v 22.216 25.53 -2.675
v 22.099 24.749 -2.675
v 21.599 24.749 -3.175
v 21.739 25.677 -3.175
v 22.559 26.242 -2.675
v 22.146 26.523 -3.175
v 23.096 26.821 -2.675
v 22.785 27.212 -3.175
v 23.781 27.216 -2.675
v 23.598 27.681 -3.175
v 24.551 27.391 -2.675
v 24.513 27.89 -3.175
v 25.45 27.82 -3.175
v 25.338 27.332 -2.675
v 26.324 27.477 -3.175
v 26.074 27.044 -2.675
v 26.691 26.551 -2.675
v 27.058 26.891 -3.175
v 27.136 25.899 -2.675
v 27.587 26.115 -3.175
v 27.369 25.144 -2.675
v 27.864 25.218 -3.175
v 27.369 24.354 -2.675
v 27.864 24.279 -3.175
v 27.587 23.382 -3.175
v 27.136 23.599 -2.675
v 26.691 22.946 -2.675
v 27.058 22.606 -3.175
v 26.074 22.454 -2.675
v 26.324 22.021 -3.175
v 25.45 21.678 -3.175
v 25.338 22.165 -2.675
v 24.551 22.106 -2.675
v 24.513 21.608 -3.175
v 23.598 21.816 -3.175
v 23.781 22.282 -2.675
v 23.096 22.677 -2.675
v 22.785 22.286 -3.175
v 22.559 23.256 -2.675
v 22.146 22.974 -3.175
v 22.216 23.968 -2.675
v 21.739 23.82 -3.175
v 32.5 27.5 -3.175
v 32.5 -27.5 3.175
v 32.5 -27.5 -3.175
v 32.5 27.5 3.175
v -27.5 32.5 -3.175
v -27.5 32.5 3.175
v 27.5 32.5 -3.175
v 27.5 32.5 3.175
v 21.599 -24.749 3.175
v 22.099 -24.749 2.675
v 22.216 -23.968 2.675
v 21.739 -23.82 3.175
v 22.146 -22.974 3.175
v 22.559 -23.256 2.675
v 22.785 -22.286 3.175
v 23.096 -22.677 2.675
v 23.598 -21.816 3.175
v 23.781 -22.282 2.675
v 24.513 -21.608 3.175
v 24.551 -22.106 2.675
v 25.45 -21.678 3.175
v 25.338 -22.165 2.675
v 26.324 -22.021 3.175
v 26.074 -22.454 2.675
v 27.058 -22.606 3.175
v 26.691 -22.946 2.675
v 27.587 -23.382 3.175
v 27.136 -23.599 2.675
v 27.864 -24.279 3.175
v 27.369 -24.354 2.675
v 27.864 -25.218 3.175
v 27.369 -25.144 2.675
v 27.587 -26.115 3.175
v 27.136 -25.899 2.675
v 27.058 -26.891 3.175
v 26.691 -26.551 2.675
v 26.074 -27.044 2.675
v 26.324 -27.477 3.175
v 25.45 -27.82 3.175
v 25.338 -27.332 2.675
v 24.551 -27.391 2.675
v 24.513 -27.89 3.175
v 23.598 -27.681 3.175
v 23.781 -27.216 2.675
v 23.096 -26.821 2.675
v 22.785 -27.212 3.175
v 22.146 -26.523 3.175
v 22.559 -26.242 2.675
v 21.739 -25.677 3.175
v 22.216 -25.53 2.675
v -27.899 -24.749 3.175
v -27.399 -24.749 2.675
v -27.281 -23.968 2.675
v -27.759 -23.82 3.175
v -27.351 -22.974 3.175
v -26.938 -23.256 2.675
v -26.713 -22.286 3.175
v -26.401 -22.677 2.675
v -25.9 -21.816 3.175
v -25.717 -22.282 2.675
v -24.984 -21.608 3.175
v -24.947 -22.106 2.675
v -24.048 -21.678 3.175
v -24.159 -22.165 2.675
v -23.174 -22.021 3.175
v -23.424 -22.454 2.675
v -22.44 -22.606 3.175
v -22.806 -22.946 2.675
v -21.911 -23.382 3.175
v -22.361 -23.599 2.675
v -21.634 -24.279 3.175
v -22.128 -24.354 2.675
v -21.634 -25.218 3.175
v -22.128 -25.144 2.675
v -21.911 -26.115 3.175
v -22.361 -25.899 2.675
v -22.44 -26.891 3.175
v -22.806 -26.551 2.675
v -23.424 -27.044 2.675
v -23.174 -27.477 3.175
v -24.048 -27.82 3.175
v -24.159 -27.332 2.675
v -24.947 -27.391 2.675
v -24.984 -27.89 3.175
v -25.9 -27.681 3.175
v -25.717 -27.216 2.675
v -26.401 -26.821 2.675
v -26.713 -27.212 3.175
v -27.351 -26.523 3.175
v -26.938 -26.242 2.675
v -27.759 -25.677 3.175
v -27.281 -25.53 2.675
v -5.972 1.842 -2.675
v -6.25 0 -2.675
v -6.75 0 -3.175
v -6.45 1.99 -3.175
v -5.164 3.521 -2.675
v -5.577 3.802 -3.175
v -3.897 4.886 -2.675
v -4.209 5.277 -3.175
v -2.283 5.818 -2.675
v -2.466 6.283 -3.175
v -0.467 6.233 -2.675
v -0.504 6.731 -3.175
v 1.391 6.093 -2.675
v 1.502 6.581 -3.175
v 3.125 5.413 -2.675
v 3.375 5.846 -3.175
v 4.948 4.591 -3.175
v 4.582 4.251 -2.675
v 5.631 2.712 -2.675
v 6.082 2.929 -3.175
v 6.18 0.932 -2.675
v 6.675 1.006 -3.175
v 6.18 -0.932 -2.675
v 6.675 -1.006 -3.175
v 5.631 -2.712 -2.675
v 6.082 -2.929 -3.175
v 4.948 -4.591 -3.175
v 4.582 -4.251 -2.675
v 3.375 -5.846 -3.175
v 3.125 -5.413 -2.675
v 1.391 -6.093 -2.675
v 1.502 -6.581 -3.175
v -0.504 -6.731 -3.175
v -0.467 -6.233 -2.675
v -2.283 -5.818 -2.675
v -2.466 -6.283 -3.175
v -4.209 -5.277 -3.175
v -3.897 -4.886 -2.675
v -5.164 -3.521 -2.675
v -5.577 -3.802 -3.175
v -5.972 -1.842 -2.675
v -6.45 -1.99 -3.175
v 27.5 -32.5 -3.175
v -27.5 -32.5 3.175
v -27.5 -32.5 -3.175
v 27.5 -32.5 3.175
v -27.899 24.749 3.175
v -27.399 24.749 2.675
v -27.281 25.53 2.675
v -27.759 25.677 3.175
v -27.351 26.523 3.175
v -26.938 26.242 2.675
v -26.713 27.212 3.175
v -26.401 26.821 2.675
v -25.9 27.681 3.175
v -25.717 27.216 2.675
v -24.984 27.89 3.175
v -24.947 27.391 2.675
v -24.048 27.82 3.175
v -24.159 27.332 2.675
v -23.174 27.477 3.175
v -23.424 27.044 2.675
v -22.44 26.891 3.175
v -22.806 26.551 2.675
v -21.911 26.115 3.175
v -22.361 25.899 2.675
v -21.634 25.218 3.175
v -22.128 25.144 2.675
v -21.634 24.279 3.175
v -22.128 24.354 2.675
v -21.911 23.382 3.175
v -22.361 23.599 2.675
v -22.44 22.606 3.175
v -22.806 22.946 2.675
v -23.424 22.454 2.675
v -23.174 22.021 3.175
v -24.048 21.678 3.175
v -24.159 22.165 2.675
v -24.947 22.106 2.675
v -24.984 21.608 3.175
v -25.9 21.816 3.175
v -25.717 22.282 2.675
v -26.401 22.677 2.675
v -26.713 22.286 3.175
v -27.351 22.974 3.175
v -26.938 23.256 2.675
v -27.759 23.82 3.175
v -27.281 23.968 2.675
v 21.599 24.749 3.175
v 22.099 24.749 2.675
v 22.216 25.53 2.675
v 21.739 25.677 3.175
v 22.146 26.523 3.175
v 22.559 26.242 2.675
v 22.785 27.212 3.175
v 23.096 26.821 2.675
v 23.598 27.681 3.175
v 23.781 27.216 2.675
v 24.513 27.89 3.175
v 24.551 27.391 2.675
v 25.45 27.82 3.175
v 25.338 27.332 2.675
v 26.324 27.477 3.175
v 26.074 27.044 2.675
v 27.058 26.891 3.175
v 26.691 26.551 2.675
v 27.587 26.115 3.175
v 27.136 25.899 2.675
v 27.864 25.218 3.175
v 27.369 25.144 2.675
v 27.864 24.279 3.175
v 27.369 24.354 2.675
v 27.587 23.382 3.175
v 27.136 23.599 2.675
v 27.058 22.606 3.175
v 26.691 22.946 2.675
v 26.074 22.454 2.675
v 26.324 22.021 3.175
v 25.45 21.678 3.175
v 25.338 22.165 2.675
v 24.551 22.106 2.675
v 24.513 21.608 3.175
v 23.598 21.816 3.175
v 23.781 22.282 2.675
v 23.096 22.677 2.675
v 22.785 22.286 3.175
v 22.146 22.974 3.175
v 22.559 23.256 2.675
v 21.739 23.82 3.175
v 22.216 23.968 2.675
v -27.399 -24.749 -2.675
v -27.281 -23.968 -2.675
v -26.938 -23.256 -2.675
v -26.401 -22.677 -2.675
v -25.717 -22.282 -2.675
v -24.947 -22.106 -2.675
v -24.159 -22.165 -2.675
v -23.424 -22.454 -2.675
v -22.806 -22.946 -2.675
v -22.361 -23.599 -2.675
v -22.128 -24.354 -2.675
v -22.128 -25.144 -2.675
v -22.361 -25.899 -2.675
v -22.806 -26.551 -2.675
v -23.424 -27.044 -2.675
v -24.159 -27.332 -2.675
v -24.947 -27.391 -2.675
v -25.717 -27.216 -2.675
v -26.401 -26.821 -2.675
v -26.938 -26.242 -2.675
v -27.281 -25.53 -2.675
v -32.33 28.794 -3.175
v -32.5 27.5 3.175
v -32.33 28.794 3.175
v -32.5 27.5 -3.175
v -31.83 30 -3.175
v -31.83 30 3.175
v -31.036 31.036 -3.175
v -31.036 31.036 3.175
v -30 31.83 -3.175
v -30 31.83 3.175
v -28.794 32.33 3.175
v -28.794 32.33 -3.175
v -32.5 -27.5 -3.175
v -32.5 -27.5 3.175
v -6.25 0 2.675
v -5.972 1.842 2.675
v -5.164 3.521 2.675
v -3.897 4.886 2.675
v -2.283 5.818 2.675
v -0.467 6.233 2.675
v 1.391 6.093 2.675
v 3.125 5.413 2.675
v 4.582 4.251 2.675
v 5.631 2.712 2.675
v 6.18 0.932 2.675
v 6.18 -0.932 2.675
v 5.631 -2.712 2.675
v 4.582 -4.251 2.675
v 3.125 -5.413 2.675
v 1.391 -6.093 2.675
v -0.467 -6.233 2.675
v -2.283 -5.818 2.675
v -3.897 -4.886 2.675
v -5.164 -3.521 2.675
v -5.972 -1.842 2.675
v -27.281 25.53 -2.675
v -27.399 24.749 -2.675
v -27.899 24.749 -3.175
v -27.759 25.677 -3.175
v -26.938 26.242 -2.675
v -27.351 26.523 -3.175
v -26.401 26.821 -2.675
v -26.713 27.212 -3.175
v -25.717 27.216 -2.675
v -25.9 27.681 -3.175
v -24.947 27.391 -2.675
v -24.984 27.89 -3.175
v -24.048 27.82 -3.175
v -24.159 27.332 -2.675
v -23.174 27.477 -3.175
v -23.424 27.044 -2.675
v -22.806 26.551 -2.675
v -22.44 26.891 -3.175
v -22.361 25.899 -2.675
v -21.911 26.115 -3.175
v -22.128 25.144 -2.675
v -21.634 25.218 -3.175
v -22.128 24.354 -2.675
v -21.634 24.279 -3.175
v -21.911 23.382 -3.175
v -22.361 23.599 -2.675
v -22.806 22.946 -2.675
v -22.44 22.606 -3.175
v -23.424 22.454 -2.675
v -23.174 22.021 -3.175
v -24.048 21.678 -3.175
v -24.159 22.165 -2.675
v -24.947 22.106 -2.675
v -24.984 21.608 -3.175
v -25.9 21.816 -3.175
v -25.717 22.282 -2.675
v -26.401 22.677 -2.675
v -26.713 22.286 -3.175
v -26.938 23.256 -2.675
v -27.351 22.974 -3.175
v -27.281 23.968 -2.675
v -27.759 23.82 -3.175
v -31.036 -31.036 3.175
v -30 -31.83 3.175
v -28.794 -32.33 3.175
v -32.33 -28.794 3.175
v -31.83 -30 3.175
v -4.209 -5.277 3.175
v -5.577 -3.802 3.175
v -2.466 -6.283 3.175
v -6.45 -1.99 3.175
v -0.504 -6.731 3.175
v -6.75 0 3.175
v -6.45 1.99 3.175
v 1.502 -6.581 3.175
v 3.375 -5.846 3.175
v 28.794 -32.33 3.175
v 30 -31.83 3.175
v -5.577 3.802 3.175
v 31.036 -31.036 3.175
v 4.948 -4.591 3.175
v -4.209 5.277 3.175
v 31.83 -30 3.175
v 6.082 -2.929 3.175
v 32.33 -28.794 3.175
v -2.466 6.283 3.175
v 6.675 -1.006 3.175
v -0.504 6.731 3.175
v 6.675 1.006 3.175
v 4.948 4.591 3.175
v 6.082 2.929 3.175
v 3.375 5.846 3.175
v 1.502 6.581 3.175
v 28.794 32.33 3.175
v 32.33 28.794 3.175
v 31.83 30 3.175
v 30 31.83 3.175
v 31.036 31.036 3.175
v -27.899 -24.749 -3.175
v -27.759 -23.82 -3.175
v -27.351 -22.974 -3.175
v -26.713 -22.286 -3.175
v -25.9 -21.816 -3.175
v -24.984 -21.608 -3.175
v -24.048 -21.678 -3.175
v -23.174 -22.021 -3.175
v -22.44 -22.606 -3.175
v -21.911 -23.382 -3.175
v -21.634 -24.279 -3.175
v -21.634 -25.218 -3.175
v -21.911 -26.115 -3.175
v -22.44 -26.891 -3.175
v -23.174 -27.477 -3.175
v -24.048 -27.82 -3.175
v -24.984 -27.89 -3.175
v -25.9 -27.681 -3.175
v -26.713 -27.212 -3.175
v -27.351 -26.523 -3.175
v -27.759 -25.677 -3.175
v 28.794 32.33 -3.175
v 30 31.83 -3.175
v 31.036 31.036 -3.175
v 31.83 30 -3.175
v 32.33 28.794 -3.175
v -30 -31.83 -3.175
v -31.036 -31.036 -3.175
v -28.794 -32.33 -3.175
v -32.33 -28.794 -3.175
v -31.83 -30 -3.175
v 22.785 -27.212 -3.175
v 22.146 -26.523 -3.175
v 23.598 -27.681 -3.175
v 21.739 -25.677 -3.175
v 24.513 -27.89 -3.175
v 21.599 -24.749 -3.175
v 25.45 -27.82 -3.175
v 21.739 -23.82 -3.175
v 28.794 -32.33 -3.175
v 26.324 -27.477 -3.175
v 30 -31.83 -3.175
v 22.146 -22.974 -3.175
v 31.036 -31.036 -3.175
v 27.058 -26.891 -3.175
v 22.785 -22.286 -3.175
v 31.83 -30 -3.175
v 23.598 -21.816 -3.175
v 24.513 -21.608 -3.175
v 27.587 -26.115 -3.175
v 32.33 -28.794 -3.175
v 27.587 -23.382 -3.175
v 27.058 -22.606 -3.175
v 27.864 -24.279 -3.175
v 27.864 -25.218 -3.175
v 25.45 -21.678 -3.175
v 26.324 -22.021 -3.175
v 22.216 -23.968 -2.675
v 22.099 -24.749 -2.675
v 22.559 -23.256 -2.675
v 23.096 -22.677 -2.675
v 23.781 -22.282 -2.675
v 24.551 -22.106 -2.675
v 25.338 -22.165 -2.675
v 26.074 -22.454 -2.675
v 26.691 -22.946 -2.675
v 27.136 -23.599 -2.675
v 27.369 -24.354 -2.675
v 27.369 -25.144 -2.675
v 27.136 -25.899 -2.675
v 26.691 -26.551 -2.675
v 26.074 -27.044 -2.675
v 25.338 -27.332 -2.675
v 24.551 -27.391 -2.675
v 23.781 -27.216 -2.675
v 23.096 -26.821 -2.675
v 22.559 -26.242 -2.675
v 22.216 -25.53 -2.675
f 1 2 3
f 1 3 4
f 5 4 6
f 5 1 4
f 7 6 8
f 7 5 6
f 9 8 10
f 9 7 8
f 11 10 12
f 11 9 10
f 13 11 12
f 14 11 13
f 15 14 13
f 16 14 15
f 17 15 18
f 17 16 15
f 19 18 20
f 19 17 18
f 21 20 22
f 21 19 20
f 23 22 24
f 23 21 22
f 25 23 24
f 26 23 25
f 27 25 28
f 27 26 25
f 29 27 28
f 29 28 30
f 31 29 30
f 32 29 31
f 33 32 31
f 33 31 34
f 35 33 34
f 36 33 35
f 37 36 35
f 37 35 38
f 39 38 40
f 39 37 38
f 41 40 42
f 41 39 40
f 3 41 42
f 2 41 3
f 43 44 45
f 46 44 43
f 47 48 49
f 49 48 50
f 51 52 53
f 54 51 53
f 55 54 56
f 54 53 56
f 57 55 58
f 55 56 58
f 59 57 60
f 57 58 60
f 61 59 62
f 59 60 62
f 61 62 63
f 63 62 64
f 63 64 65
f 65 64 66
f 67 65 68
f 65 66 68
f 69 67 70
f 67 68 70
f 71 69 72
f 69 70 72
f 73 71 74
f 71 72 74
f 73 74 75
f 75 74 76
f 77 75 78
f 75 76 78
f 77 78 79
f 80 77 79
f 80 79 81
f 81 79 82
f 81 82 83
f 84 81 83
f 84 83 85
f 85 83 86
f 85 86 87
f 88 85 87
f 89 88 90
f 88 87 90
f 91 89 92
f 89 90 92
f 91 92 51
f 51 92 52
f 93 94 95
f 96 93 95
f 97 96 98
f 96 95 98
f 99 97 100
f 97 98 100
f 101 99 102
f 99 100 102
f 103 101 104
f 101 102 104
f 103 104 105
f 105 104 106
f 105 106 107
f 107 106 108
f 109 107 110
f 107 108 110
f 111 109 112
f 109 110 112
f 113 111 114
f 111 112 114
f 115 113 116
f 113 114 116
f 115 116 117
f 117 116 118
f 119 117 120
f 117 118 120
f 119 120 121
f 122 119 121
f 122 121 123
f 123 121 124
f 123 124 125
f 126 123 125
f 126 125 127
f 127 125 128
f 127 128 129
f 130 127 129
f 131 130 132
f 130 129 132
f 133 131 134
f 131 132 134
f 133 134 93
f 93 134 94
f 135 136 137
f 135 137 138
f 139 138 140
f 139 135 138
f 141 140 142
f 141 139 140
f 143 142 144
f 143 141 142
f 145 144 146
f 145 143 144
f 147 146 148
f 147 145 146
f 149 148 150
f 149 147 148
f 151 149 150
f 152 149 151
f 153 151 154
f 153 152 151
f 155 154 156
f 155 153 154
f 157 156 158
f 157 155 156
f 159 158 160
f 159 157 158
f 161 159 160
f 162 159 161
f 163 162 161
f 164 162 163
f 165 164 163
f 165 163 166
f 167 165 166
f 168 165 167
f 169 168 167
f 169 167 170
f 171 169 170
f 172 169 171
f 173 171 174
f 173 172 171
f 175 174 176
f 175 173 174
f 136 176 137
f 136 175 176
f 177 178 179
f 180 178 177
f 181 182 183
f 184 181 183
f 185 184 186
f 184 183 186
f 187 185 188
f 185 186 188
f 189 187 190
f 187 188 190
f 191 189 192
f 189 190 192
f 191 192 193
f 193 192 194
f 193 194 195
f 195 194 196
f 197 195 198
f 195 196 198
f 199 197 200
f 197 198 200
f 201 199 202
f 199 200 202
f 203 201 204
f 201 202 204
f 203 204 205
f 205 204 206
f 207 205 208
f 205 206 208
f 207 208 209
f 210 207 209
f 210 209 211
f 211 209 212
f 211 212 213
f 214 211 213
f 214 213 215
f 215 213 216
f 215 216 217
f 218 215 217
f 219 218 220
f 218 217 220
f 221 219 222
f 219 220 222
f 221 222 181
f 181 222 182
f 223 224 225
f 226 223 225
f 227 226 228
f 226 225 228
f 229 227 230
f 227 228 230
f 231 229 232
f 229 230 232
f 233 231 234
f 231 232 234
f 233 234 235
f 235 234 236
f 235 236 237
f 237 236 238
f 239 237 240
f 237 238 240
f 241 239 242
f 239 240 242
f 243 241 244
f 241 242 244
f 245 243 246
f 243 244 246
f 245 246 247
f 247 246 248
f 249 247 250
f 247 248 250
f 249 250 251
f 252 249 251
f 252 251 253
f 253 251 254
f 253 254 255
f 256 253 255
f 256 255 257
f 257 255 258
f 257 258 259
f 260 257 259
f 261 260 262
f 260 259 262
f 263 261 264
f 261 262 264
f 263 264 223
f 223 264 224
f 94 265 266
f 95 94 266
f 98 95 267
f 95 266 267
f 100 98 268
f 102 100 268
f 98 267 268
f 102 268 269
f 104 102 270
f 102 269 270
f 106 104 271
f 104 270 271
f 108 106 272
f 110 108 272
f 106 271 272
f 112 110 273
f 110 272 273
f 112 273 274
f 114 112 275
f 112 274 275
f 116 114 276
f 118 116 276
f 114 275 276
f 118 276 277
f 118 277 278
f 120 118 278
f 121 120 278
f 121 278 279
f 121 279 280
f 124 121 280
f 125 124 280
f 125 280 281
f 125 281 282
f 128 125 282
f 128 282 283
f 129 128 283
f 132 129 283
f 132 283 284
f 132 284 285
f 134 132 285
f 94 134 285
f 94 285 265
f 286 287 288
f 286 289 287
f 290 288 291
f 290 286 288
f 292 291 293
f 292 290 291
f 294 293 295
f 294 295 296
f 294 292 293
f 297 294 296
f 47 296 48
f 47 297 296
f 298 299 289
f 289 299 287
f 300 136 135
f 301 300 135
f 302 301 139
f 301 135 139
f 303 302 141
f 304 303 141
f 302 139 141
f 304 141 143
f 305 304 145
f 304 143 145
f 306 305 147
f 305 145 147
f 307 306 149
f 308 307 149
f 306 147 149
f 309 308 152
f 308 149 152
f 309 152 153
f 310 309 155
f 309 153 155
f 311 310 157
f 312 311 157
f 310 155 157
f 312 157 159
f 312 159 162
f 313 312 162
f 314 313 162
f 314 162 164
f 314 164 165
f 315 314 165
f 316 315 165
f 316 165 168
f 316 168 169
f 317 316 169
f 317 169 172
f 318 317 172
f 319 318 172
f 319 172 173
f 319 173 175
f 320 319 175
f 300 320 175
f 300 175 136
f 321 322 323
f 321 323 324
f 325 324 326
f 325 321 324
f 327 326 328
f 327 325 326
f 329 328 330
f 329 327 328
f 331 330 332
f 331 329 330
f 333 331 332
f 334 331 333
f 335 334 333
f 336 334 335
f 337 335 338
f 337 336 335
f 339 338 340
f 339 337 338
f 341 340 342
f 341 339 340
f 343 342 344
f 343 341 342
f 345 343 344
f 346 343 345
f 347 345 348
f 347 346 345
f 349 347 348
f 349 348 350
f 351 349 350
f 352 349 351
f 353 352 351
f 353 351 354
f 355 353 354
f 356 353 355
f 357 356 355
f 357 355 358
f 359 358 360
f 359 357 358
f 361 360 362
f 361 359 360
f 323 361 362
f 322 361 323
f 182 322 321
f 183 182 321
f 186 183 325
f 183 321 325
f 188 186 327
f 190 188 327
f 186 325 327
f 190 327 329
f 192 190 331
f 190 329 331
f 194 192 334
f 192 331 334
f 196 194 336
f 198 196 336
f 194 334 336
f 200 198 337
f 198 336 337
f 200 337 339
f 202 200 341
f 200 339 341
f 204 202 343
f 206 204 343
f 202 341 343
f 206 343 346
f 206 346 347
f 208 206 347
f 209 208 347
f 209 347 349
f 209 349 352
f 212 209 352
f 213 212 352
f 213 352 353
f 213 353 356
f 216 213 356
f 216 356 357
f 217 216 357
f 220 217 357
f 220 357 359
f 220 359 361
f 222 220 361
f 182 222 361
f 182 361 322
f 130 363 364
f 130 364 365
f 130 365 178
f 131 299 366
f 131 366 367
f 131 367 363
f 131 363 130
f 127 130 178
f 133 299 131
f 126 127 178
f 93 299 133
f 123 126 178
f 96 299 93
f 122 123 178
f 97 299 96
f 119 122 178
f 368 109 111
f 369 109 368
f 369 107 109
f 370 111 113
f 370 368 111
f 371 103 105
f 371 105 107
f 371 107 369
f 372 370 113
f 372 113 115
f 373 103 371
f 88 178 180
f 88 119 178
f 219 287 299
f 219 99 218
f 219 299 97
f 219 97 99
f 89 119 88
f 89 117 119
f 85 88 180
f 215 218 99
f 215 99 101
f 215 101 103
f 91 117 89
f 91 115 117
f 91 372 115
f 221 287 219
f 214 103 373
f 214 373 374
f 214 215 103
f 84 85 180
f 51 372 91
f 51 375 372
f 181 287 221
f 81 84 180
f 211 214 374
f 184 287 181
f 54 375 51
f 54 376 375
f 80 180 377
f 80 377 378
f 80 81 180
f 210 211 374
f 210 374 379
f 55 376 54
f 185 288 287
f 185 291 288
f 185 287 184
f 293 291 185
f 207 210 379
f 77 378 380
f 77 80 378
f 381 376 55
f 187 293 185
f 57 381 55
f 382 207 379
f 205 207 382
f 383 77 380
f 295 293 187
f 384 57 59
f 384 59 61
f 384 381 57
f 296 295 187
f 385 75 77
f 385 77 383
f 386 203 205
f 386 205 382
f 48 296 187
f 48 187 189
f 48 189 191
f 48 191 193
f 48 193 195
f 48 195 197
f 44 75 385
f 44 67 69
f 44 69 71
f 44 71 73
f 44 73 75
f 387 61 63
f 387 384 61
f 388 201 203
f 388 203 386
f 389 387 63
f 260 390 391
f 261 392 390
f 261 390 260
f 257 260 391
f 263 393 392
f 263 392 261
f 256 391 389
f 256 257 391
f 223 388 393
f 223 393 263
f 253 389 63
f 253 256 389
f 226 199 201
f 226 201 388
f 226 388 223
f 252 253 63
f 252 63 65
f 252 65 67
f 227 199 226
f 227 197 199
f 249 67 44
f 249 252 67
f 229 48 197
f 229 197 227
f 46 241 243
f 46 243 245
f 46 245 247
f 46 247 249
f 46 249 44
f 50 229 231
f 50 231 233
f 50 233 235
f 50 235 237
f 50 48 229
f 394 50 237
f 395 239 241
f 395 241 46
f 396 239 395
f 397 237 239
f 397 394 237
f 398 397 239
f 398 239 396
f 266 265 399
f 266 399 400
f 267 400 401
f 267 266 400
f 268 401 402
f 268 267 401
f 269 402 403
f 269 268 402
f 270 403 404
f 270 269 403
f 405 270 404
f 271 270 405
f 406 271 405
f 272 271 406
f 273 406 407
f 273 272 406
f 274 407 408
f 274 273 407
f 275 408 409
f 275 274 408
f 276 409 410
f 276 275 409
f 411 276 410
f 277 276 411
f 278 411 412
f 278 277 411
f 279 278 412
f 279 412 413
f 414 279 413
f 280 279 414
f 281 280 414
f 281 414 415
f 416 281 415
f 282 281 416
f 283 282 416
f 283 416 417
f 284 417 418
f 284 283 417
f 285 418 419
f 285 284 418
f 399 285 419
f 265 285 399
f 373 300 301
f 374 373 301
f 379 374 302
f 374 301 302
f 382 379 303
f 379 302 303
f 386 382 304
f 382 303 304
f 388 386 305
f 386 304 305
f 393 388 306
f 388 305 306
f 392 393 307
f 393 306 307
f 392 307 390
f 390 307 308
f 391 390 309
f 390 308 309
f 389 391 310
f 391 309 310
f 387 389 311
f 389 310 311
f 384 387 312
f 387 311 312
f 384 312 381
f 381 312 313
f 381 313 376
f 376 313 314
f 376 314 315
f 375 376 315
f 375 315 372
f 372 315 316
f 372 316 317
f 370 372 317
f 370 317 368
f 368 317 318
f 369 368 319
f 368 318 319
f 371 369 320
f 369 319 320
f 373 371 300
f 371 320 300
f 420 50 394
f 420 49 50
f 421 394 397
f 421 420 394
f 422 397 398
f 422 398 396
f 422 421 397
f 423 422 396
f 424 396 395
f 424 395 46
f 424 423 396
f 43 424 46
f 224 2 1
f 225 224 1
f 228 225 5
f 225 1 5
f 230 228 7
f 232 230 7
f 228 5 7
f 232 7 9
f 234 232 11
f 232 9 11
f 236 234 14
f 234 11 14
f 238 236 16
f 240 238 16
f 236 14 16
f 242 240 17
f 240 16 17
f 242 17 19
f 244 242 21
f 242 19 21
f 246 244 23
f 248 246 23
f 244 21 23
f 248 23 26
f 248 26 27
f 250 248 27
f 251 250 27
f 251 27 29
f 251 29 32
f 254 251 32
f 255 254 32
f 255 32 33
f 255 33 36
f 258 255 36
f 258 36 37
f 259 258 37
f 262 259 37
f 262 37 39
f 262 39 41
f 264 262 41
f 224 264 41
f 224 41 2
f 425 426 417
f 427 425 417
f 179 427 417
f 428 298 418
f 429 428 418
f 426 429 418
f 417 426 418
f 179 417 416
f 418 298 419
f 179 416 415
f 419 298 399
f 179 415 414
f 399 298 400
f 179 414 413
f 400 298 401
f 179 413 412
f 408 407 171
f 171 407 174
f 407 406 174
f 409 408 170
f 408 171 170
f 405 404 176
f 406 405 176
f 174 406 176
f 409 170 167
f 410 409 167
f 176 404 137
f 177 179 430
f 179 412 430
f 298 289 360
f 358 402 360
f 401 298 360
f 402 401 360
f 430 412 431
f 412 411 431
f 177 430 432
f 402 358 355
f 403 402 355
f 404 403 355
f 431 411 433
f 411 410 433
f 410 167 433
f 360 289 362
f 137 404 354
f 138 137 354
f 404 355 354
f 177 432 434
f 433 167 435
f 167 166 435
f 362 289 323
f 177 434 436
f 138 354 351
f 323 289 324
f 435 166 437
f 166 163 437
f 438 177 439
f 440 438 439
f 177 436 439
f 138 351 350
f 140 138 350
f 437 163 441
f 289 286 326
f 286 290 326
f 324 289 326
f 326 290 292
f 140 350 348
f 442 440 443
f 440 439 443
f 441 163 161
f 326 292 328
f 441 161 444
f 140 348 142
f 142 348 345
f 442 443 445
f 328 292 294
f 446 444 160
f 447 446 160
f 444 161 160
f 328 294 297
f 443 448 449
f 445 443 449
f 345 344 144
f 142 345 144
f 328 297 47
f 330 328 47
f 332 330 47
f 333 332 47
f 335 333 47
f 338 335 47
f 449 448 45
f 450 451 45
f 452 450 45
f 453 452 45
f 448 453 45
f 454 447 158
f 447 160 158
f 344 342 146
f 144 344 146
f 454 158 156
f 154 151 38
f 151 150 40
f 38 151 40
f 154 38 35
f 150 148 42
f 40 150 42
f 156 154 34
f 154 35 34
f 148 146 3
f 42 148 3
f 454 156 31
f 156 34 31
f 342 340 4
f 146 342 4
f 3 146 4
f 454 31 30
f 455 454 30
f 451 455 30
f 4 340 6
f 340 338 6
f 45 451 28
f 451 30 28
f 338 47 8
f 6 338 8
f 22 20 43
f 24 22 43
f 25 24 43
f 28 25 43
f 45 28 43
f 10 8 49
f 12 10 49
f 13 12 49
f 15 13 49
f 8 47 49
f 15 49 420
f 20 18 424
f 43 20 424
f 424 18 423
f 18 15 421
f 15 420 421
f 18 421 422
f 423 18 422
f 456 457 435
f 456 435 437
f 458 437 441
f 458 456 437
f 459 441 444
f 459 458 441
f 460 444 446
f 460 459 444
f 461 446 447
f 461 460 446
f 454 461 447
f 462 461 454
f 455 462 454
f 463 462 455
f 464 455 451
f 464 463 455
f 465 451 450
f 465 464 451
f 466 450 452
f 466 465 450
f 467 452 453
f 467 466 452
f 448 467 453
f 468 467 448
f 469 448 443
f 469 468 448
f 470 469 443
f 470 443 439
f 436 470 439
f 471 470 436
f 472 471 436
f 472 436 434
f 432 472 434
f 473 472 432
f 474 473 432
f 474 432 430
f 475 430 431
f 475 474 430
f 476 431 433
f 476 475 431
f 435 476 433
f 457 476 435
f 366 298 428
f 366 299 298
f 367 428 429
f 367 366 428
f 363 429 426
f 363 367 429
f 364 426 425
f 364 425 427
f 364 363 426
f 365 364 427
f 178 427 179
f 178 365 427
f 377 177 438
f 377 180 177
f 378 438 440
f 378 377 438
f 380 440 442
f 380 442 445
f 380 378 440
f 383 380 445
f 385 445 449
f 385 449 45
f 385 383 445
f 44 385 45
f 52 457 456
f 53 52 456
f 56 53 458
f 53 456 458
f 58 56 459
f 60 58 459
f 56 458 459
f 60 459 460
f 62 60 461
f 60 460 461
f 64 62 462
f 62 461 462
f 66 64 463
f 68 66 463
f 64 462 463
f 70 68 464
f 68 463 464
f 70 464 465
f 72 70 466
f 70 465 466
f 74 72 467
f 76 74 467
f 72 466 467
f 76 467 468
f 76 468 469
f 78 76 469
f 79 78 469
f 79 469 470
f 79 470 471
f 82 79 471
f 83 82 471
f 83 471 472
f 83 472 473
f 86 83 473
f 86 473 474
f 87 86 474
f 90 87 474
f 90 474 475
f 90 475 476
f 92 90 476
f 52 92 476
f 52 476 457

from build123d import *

# Parameters (mm, degrees)
SKETCH1_W                  = 65
SKETCH1_H                  = 65
F_1_4_IN_SHEET_METAL_DEPTH = 3.175
M12_CLEARANCE_HOLE_D       = 12.5
M5_CLEARANCE_HOLE1_D       = 5.3
FILLET1_5_MM_R             = 5
CHAMFER_0_5_MM_SIZE        = 0.5


with BuildPart() as part:
    # Sketch1 → 1/4 in Sheet Metal (new, symmetric)
    with BuildSketch(Plane.XY):
        Rectangle(SKETCH1_W, SKETCH1_H)
    extrude(amount=F_1_4_IN_SHEET_METAL_DEPTH, both=True)

    # M12 Clearance Hole (through all)
    with Locations(Plane.XY.offset(3.175)):
        with Locations((0, 0)):
            Hole(M12_CLEARANCE_HOLE_D / 2)

    # M5 Clearance Hole1 (through all)
    with Locations(Plane.XY.offset(3.175)):
        with Locations((24.748737342, 24.748737342), (-24.748737342, 24.748737342), (-24.748737342, -24.748737342), (24.748737342, -24.748737342)):
            Hole(M5_CLEARANCE_HOLE1_D / 2)

    # Fillet1 5 mm
    fillet1_5_mm_edges = [part.edges().sort_by_distance(p)[0] for p in [
        (32.5, -32.5, 0),
        (-32.5, -32.5, 0),
        (-32.5, 32.5, 0),
        (32.5, 32.5, 0),
    ]]
    fillet(fillet1_5_mm_edges, radius=FILLET1_5_MM_R)

    # Chamfer 0.5 mm
    chamfer_0_5_mm_edges = [part.edges().sort_by_distance(p)[0] for p in [
        (6.25, 0, 3.175),
        (6.25, 0, -3.175),
        (27.398737342, -24.748737342, 3.175),
        (27.398737342, -24.748737342, -3.175),
        (-22.098737342, -24.748737342, 3.175),
        (-22.098737342, -24.748737342, -3.175),
        (-22.098737342, 24.748737342, 3.175),
        (-22.098737342, 24.748737342, -3.175),
        (27.398737342, 24.748737342, 3.175),
        (27.398737342, 24.748737342, -3.175),
    ]]
    chamfer(chamfer_0_5_mm_edges, length=CHAMFER_0_5_MM_SIZE)


solid = part.part
